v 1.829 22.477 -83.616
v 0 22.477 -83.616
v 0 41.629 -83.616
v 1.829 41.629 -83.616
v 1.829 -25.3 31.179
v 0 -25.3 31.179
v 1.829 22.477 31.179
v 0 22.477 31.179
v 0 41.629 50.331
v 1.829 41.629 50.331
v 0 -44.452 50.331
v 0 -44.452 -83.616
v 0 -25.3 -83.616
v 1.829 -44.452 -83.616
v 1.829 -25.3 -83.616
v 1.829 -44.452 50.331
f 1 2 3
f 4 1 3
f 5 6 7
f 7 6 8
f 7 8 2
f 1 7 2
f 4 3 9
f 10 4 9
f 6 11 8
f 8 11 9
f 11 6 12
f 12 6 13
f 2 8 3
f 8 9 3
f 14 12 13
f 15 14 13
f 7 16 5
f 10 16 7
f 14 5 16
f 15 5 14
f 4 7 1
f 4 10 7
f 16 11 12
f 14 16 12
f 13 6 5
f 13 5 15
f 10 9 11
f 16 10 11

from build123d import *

# Parameters (mm, degrees)
SKETCH1_W           = 114.7953
SKETCH1_H           = 19.1516
SKETCH1_W_2         = 19.1516
BOSS_EXTRUDE1_DEPTH = 1.8288


with BuildPart() as part:
    # Sketch1 → Boss-Extrude1 (new body)
    with BuildSketch(Plane(origin=(0, 0, 0), x_dir=(0, 0, -1), z_dir=(1, 0, 0))):
        Polygon((-31.179336382, -25.30028674), (-31.179336382, 22.47711326), (-31.179336382, 41.62871326), (-50.330936382, 41.62871326), (-50.330936382, -25.30028674), align=None)
        with Locations((26.218313618, 32.05291326)):
            Rectangle(SKETCH1_W, SKETCH1_H)
        with Locations((26.218313618, -34.87608674)):
            Rectangle(SKETCH1_W, SKETCH1_H)
        with Locations((-40.755136382, -34.87608674)):
            Rectangle(SKETCH1_W_2, SKETCH1_H)
    extrude(amount=BOSS_EXTRUDE1_DEPTH)


solid = part.part
